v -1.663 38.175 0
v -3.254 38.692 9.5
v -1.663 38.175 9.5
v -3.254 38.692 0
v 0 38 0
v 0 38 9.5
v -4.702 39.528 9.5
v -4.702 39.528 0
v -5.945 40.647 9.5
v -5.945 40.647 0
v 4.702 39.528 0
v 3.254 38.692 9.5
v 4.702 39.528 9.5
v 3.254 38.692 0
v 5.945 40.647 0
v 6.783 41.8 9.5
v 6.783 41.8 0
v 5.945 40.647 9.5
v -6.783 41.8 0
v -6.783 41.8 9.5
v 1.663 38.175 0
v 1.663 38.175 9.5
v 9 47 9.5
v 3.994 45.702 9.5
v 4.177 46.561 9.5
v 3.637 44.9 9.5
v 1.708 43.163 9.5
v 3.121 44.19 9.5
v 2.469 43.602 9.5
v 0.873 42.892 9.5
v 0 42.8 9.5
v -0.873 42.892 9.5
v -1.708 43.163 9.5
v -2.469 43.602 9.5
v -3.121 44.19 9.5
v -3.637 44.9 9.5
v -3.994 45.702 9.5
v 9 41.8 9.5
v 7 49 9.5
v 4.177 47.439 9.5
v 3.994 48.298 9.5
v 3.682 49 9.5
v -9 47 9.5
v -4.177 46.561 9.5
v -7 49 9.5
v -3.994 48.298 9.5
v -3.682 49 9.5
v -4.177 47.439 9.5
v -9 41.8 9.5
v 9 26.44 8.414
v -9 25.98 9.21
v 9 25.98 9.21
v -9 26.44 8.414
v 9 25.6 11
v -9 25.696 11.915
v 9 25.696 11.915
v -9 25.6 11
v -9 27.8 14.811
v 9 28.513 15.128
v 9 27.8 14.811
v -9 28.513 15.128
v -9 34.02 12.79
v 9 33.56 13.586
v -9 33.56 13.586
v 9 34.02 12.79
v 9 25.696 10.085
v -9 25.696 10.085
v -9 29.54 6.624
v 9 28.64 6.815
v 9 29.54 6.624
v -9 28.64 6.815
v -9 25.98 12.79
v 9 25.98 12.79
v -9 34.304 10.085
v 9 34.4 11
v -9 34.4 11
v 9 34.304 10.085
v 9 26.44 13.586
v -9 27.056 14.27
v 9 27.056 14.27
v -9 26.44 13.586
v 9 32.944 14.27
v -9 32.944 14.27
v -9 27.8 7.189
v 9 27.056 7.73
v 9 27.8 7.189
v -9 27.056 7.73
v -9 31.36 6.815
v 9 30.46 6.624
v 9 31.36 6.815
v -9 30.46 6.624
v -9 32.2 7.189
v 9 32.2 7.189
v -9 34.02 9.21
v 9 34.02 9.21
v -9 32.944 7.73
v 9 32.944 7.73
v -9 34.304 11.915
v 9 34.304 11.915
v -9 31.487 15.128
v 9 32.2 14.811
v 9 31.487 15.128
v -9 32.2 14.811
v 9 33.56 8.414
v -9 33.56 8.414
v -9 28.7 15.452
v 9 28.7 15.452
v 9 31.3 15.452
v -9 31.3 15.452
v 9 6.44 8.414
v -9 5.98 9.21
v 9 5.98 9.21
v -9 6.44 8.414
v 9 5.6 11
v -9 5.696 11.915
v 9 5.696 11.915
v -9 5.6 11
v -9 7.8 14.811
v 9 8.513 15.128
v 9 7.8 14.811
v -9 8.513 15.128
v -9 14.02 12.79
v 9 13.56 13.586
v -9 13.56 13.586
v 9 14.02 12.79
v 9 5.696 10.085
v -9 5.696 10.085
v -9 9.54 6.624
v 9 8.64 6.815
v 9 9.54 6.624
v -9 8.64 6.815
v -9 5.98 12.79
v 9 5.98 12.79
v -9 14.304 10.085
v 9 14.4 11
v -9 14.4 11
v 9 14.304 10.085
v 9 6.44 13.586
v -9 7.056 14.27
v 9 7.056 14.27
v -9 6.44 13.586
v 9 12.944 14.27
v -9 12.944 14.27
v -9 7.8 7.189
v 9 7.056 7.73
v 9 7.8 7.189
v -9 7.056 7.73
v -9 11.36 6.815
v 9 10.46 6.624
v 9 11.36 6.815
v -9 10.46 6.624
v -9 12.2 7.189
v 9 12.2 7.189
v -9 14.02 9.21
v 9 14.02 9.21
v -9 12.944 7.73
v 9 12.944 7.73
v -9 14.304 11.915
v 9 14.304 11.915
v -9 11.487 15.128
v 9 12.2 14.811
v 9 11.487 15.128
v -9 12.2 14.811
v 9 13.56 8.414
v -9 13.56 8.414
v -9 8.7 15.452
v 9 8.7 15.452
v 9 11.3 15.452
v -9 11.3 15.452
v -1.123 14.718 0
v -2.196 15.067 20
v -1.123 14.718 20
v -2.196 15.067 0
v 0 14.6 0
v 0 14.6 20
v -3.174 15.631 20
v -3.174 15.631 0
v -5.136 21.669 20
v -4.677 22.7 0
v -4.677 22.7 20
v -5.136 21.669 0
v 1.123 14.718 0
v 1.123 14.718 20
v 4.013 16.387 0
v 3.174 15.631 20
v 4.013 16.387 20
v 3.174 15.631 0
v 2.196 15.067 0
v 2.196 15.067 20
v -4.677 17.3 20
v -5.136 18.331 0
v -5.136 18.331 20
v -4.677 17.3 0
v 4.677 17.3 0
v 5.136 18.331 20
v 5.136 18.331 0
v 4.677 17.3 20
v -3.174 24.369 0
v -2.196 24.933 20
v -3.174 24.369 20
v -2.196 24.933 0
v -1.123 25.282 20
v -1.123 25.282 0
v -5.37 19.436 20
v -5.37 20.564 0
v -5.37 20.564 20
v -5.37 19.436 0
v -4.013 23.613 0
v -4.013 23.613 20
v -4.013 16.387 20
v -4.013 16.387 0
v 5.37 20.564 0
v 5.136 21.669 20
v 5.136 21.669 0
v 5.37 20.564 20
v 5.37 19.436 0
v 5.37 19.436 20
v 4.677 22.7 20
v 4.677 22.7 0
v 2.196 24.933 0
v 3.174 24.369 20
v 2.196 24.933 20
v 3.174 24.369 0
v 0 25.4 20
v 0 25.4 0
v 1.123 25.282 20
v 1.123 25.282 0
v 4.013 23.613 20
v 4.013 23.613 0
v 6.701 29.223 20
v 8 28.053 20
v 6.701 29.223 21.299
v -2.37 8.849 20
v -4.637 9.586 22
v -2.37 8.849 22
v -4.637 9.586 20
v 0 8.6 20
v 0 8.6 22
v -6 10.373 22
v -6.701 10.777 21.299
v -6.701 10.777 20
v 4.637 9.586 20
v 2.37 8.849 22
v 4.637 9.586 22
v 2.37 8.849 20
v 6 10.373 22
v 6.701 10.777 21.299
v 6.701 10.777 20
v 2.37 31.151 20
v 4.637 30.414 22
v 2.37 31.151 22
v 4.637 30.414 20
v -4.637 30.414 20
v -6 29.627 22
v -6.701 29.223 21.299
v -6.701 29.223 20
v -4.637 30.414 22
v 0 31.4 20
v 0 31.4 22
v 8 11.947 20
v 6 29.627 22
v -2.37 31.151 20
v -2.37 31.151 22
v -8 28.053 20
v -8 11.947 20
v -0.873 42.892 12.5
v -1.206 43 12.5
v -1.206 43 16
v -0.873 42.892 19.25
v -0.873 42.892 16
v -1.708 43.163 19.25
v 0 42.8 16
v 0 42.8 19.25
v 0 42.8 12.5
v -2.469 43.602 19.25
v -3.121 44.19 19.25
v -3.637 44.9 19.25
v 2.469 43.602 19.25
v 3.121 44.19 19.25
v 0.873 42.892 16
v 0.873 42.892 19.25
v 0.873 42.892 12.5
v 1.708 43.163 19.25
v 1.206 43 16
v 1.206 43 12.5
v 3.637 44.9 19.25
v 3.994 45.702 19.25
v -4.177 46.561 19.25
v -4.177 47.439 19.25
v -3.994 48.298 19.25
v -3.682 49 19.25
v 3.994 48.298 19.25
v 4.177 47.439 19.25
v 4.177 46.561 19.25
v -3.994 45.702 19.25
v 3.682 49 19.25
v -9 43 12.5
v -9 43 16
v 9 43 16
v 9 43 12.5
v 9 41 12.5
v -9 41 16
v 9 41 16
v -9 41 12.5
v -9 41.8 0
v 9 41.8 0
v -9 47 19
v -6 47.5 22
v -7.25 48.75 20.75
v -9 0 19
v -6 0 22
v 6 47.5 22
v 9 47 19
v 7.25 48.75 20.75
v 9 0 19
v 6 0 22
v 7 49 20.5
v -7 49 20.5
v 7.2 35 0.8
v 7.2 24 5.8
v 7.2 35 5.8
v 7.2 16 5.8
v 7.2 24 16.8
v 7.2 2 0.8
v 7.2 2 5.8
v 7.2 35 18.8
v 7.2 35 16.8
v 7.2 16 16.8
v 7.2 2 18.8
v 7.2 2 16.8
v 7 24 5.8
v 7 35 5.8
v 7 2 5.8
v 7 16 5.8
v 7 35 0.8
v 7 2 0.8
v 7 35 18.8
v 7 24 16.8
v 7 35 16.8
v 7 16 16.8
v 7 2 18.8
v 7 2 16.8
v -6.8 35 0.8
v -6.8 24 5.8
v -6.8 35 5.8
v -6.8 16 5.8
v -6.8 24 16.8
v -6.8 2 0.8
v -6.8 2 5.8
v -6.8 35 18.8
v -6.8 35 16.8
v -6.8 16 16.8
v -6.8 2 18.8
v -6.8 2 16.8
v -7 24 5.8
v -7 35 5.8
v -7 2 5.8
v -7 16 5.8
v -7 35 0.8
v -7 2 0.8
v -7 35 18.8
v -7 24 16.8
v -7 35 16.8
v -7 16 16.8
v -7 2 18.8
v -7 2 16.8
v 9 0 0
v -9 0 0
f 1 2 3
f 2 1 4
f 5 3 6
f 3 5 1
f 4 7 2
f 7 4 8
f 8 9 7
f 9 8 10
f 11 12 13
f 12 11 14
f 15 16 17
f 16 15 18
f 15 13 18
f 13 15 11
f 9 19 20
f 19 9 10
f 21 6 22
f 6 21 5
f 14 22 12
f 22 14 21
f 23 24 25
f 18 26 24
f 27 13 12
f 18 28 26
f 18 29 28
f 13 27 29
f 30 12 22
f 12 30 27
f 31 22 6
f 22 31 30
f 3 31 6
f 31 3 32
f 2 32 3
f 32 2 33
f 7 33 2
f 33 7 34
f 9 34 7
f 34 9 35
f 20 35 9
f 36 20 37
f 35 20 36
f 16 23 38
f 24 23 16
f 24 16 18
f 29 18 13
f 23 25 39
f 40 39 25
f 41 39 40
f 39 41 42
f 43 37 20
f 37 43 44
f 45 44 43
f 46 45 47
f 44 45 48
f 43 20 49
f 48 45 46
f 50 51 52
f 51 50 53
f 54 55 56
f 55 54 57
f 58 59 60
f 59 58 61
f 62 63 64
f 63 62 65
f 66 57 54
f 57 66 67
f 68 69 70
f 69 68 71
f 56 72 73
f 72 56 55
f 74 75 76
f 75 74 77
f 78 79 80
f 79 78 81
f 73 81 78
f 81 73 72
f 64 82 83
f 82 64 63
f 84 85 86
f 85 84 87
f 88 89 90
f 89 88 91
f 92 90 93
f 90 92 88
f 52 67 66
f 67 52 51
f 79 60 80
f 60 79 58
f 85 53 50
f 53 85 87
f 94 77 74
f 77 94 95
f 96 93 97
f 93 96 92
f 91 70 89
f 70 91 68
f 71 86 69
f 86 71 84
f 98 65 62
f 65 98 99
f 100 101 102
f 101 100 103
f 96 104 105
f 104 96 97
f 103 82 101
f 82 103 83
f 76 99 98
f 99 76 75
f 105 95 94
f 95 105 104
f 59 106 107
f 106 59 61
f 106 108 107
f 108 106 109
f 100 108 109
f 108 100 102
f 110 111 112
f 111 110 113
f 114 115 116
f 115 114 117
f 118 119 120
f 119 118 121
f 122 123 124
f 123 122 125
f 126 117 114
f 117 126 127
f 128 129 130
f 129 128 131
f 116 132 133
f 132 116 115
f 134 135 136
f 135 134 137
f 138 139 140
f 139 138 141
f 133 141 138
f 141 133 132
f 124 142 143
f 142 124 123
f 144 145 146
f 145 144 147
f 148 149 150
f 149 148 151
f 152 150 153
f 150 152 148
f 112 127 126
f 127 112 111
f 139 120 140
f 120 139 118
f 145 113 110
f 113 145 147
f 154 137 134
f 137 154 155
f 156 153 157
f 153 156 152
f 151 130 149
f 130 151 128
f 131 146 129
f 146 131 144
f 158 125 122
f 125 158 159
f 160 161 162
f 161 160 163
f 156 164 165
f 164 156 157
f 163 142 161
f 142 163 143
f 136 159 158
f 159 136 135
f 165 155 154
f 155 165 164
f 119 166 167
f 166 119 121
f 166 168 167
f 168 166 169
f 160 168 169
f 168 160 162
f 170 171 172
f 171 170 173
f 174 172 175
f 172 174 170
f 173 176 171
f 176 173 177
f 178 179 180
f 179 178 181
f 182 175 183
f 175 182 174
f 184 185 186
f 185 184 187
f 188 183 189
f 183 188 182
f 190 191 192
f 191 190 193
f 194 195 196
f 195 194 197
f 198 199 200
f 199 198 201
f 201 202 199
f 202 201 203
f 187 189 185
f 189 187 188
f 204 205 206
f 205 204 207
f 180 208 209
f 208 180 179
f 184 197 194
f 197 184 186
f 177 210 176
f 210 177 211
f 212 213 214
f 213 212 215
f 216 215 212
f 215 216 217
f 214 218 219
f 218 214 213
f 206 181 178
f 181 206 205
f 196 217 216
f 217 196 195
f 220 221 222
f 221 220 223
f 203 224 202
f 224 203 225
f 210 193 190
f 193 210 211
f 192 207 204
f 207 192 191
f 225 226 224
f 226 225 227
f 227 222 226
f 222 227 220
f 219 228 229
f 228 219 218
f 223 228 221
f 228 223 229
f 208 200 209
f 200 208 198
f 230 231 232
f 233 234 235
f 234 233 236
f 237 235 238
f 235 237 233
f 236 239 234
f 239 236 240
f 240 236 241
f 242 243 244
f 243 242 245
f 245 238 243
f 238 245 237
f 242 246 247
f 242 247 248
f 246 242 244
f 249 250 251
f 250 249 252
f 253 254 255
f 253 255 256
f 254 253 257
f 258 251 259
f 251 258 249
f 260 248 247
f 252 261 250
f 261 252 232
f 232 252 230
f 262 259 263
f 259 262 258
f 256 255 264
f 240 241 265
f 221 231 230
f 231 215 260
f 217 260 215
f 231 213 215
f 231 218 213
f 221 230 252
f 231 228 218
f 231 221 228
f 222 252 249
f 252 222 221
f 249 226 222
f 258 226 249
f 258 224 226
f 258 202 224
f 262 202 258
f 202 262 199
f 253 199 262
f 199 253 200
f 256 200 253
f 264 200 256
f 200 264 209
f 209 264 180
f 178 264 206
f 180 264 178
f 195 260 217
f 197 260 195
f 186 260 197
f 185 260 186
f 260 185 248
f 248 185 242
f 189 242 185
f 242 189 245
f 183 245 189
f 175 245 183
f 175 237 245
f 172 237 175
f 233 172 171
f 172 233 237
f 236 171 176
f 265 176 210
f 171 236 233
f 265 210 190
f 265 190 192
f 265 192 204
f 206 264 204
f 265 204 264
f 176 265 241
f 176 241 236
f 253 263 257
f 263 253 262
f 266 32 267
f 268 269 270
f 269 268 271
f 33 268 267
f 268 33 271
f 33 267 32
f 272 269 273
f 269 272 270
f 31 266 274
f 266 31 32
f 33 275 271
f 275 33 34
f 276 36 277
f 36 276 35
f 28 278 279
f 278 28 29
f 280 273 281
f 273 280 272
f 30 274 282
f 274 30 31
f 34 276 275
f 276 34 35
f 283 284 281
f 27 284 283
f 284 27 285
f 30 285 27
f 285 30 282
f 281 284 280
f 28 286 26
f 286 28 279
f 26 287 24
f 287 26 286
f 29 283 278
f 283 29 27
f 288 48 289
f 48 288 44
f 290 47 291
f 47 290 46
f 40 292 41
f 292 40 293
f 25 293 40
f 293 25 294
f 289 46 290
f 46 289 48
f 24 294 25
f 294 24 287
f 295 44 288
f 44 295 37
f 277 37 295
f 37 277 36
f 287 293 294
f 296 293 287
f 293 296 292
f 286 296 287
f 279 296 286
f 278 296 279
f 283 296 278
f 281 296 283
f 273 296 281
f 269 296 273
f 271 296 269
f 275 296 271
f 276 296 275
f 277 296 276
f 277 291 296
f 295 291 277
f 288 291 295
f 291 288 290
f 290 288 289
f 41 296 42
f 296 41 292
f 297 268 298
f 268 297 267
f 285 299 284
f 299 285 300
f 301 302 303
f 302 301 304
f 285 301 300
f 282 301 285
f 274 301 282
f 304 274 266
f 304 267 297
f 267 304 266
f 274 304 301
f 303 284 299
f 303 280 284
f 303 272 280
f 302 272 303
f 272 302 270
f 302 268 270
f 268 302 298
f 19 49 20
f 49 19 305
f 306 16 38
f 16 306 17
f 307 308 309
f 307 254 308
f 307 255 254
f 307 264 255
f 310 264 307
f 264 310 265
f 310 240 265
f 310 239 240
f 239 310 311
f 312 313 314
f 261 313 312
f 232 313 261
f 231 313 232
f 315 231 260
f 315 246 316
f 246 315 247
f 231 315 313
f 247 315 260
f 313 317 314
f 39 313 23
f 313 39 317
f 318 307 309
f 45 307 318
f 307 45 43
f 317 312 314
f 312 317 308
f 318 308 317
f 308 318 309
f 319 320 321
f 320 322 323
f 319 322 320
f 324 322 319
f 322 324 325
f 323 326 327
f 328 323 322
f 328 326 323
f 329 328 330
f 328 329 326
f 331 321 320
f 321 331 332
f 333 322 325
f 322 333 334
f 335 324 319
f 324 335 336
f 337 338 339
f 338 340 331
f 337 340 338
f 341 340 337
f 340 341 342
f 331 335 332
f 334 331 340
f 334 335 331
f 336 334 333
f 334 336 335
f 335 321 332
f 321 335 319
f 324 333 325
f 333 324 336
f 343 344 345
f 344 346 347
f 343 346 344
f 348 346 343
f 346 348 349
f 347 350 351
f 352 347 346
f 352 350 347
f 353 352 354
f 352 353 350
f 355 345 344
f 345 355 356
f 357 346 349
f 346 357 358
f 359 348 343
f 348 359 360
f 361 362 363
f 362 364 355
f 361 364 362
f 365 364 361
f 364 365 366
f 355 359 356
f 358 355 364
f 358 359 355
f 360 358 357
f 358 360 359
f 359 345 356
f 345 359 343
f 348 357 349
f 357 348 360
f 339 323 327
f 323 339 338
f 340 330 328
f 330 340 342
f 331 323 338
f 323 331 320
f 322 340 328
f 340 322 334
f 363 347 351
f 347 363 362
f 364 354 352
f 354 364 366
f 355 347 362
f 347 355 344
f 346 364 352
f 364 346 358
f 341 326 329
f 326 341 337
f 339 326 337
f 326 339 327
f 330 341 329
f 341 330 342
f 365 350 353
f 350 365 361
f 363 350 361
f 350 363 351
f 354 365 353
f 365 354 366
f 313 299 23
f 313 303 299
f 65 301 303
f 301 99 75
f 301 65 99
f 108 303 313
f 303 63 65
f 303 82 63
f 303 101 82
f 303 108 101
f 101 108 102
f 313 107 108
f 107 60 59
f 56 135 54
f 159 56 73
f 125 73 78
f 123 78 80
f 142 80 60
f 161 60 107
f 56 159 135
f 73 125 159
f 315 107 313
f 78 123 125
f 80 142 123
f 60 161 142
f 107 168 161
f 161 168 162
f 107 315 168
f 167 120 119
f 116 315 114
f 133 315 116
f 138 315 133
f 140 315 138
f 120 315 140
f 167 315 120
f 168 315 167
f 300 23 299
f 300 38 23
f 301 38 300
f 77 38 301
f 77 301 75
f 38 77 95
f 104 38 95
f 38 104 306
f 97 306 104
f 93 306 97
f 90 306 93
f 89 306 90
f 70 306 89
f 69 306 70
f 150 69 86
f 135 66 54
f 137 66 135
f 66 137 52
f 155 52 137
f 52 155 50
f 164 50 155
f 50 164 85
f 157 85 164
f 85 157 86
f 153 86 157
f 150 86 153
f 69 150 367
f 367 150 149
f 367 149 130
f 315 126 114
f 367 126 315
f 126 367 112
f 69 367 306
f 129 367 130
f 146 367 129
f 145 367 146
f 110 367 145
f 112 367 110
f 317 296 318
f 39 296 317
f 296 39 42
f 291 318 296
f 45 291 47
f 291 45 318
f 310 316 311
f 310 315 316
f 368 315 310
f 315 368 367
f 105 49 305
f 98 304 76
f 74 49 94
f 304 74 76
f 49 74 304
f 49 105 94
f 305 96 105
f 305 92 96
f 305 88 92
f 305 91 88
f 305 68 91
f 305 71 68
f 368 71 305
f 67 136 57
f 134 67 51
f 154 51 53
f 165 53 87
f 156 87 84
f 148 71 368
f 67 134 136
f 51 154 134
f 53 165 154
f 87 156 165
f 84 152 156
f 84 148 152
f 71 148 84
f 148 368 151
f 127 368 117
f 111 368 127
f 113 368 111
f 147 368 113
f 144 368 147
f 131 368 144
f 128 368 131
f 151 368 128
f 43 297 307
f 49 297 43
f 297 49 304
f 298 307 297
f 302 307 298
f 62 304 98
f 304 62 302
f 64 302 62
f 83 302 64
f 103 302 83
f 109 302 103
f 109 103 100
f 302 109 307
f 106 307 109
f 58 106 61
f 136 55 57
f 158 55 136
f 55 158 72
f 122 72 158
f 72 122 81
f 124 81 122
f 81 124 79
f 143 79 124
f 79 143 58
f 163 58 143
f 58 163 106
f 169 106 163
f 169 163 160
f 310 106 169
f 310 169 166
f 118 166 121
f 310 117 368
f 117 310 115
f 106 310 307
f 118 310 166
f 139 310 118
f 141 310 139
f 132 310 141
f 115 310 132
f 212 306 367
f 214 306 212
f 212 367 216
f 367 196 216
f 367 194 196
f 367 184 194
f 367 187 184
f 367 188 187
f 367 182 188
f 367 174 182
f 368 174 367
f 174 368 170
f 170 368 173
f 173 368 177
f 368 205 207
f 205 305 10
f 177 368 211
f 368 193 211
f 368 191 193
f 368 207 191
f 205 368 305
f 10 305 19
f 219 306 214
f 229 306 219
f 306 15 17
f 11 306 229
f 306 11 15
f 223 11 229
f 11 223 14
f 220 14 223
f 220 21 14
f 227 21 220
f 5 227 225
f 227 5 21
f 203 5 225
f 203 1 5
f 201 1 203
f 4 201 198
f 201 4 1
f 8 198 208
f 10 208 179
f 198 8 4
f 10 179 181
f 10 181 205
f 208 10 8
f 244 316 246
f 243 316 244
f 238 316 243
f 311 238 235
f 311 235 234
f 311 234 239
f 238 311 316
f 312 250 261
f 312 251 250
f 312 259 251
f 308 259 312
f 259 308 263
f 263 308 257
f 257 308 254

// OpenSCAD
// PRUSA iteration3
// Y frame corners
// GNU GPL v3
// Josef Průša <iam@josefprusa.cz> and contributors
// http://www.reprap.org/wiki/Prusa_Mendel
// http://prusamendel.org
// Parameterized by D. Scott Williamson

metric=true;

inch2mm=25.4;

// horizontal rod dimensions
horizontal_rod_radius = (metric ? 4 : ((5/16)*inch2mm/2));
horizontal_rod_hole_radius= horizontal_rod_radius + 0.4;
horizontal_rod_length=270;
horizontal_rod_bridge_radius=2.6;
horizontal_rod_washer_radius=(metric ? 10 : ((15/16)*inch2mm/2));
horizontal_rod_lower_height=horizontal_rod_washer_radius;
horizontal_rod_upper_height=horizontal_rod_washer_radius*3;

// longitudinal rod dimensions
longitudinal_rod_radius= (metric ? 5 : ((1/2)*inch2mm/2));
longitudinal_rod_hole_radius= longitudinal_rod_radius + 0.4;
longitudinal_rod_length=270;
longitudinal_rod_washer_radius=(metric ? 11 : ((1+3/8)*inch2mm/2));
longitudinal_rod_washer_hole_radius=longitudinal_rod_washer_radius + 0.4;
longitudinal_rod_washer_height=10;

smooth_rod_radius=4.2;
smooth_rod_length=10;

corner_width=(longitudinal_rod_radius*2)+8;
corner_height=(horizontal_rod_radius*2)+14;
corner_depth=49;

lm8uu_keepout_radius=8;
lm8uu_keepout_length=270;

ziptie_width=3.5;
ziptie_length=30;
ziptie_height=2;

// Default facets for cylinders
$fn=30;

module corner_base()
{	
	translate([-corner_width/2,-corner_height/2,0])
		cube([corner_width,corner_height,corner_depth]);
}

module corner_holes()
{
	translate([-11,-corner_height/2,0])
	{
		// Top hole for horizontal rod
		translate([0,corner_height/2,horizontal_rod_upper_height]) 
			rotate([0,90,0]) 
				translate([0,0,-5]) 
					cylinder(h = horizontal_rod_length, r=horizontal_rod_hole_radius);
		// Top hole bridge for horizontal rod
		translate([0,8.8,horizontal_rod_upper_height])
			rotate([0,90,0]) 
				translate([0,0,-5]) 
					cylinder(h = horizontal_rod_length, r=horizontal_rod_bridge_radius, $fn=6);

		// Bottom hole for horizontal rod
		translate([0,corner_height/2,horizontal_rod_lower_height]) 
			rotate([0,90,0]) 
				translate([0,0,-5]) 
					cylinder(h = horizontal_rod_length, r=horizontal_rod_hole_radius);
		// Bottom hole bridge for horizontal rod
		translate([0,8.8,horizontal_rod_lower_height]) 
			rotate([0,90,0]) 
				translate([0,0,-5]) 
					cylinder(h = horizontal_rod_length, r=horizontal_rod_bridge_radius, $fn=6);

		// Middle hole for larger longitudinal rod
		translate([11,0,20]) 
			rotate([0,0,90]) 
				rotate([0,90,0]) 
					translate([0,0,-5]) 
						cylinder(h = longitudinal_rod_length, r=longitudinal_rod_hole_radius);

		// Washer hole for larger longitudinal rod
		translate([11,-3,20]) 
			rotate([0,0,90]) 
				rotate([0,90,0]) 
					translate([0,0,-5]) 
						cylinder(h = longitudinal_rod_washer_height, r=longitudinal_rod_washer_hole_radius);

		// Smooth rod place
		translate([11,2.75,47]) 
			rotate([0,90,90]) 
				cylinder(h = smooth_rod_length, r=smooth_rod_radius); 
		
		// Ziptie for smooth rod
		translate([-5,6,41])  
			cube([ziptie_length,ziptie_width,ziptie_height]);

		// LM8UU keepout
		difference()
		{
			translate([11,12.5,46]) 
				rotate([0,90,90]) 
					cylinder(h = lm8uu_keepout_length, r=lm8uu_keepout_radius);
			translate([21,12.5,62]) 
				rotate([0,90,90]) 
					cube([20,20,30]);
		} 

		// Subtractive block dimension
		block_width=30;

		// Top smooth rod clearance knockout
		translate([corner_height/2+block_width/2,12.5,corner_depth+8]) 
			rotate([0,90,90]) 
				cube([(block_width/2)+0.2,block_width,block_width]);
	}
}


module corner_fancy()
{
	// Subtractive block dimension
	block_width=30;

	// Side corner cutouts
	translate([-(corner_width/2-1),-(corner_height/2-2),0])
		rotate([0,0,-45-180])
			translate([-block_width/2,0,-1]) 
				cube([block_width,block_width,corner_depth+2]);

	translate([(corner_width/2-1),-(corner_height/2-2),0])	
		rotate([0,0,45-180]) 
			translate([-block_width/2,0,-1]) 
				cube([block_width,block_width,corner_depth+2]);

	// Top corner cutouts
	translate([(corner_width/2-2),0,corner_depth]) 
		rotate([0,45,0]) 
			translate([-block_width/2,-block_width/2,0]) 
				cube([block_width,block_width,block_width]);

	translate([-(corner_width/2-2),0,corner_depth]) 
		rotate([0,-45,0]) 
			translate([-block_width/2,-block_width/2,0]) 
				cube([block_width,block_width,block_width]);

	// Top front edge cutout
	rotate([0,0,90])
		translate([-(corner_height/2-1.5),0,corner_depth]) 	
			rotate([0,-45,0]) 
				translate([-block_width/2,-block_width/2,0]) 
					cube([block_width,block_width,block_width]);
}

module selective_infill()
{
	translate([7,2,0.8])
		cube([0.2,33,5]); 
	translate([-7,2,0.8])
		cube([0.2,33,5]);
	
	translate([ 7,16,5.8])
		cube([0.2,8,11]);
	translate([-7,16,5.8])
		cube([0.2,8,11]);
	
	translate([7,2,16.8])
		cube([0.2,33,2]); 
	translate([-7,2,16.8])
		cube([0.2,33,2]);
}
    
// Final part
module corner()
{
	// Rotate the part for better printing
	translate([0,0,corner_height/2]) rotate([-90,0,0]) 
	{
		difference()
		{
			corner_base();
			corner_holes();
			corner_fancy();
			translate([0,corner_height/2,0]) 
				rotate([90,0,0])
					selective_infill();
		}
	}
}

// Render part
corner();
